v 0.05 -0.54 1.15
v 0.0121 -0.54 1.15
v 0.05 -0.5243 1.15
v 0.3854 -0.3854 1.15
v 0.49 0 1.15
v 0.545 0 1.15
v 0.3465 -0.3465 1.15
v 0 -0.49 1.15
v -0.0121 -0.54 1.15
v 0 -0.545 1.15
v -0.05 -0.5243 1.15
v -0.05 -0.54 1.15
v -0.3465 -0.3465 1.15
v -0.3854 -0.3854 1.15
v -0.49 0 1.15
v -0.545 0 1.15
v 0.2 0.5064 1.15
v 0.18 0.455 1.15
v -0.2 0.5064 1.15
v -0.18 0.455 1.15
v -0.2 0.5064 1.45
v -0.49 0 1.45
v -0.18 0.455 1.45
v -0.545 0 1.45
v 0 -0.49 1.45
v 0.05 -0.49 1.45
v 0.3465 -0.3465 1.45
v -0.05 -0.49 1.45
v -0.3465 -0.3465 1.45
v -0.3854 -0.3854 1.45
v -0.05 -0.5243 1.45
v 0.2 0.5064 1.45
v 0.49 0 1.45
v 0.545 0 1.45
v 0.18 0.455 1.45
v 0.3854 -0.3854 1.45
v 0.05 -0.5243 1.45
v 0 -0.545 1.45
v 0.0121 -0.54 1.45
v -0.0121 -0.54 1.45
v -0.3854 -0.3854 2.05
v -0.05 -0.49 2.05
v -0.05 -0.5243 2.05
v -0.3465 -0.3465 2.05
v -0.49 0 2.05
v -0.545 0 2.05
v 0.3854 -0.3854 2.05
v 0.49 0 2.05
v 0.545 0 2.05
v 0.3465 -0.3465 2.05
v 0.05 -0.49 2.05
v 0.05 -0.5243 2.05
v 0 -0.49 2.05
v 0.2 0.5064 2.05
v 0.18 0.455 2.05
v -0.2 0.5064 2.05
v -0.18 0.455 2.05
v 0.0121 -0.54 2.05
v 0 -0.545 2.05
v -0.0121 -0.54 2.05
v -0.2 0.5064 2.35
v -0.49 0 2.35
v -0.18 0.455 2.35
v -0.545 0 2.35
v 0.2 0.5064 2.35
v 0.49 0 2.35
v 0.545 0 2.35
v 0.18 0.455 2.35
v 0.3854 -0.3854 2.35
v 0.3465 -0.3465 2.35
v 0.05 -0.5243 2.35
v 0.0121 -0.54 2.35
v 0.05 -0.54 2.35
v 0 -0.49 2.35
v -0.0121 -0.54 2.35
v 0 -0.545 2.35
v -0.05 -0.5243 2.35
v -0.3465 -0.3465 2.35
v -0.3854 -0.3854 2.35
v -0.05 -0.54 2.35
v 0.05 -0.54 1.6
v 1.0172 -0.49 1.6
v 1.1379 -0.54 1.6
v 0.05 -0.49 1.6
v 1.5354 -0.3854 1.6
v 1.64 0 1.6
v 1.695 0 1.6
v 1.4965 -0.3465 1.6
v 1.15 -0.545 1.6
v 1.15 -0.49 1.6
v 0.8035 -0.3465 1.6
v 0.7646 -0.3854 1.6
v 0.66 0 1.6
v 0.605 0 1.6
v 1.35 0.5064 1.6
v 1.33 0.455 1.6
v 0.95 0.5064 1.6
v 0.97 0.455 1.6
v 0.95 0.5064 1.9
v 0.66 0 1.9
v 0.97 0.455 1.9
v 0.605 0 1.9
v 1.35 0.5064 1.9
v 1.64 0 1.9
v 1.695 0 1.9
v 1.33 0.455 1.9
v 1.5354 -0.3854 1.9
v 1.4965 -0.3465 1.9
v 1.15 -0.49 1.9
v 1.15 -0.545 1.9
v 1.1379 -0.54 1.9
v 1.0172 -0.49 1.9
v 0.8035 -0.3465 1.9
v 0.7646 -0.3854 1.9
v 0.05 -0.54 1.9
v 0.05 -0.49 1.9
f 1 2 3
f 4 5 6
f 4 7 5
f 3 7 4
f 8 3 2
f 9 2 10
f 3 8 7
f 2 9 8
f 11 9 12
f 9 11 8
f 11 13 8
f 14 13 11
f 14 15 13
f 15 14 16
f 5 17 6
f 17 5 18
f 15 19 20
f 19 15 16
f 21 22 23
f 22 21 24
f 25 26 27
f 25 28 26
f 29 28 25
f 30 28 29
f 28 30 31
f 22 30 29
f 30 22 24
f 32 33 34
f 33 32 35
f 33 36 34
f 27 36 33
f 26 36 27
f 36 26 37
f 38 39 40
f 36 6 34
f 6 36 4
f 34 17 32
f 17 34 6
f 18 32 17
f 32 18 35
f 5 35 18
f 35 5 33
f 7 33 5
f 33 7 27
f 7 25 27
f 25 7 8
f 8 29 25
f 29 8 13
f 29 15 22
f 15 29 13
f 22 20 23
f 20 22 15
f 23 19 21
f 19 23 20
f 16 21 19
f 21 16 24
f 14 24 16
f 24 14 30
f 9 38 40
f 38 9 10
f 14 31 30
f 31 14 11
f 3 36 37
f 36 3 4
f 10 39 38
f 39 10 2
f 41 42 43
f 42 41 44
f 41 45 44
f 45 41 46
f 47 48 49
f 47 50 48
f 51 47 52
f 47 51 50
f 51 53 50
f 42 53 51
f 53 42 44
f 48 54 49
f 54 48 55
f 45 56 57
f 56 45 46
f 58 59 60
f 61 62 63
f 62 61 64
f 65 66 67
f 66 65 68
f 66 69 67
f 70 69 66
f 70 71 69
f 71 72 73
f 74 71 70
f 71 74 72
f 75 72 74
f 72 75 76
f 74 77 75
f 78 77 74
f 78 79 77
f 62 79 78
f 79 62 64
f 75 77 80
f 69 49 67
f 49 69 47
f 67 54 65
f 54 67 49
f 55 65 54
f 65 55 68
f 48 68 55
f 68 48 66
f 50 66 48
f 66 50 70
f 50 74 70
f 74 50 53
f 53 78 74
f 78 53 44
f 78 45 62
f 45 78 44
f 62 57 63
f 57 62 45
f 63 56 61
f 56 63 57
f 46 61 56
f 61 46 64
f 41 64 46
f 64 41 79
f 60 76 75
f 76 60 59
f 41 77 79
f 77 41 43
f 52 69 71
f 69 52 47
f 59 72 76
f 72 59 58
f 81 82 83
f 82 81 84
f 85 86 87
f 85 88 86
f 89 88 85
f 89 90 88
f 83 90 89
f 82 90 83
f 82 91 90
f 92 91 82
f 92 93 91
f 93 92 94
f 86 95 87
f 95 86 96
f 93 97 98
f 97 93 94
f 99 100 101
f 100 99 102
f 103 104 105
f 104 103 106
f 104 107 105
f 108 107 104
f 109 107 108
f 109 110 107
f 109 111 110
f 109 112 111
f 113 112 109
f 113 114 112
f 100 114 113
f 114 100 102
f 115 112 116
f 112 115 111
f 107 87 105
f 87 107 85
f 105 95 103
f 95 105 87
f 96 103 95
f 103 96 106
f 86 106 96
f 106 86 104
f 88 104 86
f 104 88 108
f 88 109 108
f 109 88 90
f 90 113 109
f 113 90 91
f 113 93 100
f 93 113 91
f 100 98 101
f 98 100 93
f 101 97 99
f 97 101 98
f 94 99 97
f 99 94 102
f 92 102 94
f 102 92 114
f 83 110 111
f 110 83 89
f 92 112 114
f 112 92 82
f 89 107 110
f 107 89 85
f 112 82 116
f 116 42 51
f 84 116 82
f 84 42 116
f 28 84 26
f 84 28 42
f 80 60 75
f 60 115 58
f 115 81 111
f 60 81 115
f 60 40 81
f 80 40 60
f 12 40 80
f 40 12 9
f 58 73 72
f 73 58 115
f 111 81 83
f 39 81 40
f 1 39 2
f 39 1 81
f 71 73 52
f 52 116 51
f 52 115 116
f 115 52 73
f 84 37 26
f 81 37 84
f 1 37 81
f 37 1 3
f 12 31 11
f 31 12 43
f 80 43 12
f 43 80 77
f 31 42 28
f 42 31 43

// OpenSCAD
// Low-poly M28-style clip, dimensions and pitch shared with belt-link.scad.
pitch=1.15; inner=0.49; outer=0.545;
// Five pairs of polygon vertices: open at +y, with exact extrema of the reference.
outer_pts=[[-.20,.506421],[-outer,0],[-.385373,-.385373],[0,-outer],[.385373,-.385373],[outer,0],[.20,.506421]];
inner_pts=[[-.18,.455],[-inner,0],[-.346482,-.346482],[0,-inner],[.346482,-.346482],[inner,0],[.18,.455]];
module sleeve(z,len,x=0){translate([x,0,z]) linear_extrude(height=len) polygon(concat(outer_pts,[for(i=[6:-1:0]) inner_pts[i]]));}
module belt_link_lo(){union(){sleeve(1.15,.30);sleeve(2.05,.30);sleeve(1.60,.30,pitch);translate([0,-.54,1.60]) cube([pitch,.05,.30]);translate([-.05,-.54,1.15]) cube([.10,.05,1.20]);}}
belt_link_lo();
